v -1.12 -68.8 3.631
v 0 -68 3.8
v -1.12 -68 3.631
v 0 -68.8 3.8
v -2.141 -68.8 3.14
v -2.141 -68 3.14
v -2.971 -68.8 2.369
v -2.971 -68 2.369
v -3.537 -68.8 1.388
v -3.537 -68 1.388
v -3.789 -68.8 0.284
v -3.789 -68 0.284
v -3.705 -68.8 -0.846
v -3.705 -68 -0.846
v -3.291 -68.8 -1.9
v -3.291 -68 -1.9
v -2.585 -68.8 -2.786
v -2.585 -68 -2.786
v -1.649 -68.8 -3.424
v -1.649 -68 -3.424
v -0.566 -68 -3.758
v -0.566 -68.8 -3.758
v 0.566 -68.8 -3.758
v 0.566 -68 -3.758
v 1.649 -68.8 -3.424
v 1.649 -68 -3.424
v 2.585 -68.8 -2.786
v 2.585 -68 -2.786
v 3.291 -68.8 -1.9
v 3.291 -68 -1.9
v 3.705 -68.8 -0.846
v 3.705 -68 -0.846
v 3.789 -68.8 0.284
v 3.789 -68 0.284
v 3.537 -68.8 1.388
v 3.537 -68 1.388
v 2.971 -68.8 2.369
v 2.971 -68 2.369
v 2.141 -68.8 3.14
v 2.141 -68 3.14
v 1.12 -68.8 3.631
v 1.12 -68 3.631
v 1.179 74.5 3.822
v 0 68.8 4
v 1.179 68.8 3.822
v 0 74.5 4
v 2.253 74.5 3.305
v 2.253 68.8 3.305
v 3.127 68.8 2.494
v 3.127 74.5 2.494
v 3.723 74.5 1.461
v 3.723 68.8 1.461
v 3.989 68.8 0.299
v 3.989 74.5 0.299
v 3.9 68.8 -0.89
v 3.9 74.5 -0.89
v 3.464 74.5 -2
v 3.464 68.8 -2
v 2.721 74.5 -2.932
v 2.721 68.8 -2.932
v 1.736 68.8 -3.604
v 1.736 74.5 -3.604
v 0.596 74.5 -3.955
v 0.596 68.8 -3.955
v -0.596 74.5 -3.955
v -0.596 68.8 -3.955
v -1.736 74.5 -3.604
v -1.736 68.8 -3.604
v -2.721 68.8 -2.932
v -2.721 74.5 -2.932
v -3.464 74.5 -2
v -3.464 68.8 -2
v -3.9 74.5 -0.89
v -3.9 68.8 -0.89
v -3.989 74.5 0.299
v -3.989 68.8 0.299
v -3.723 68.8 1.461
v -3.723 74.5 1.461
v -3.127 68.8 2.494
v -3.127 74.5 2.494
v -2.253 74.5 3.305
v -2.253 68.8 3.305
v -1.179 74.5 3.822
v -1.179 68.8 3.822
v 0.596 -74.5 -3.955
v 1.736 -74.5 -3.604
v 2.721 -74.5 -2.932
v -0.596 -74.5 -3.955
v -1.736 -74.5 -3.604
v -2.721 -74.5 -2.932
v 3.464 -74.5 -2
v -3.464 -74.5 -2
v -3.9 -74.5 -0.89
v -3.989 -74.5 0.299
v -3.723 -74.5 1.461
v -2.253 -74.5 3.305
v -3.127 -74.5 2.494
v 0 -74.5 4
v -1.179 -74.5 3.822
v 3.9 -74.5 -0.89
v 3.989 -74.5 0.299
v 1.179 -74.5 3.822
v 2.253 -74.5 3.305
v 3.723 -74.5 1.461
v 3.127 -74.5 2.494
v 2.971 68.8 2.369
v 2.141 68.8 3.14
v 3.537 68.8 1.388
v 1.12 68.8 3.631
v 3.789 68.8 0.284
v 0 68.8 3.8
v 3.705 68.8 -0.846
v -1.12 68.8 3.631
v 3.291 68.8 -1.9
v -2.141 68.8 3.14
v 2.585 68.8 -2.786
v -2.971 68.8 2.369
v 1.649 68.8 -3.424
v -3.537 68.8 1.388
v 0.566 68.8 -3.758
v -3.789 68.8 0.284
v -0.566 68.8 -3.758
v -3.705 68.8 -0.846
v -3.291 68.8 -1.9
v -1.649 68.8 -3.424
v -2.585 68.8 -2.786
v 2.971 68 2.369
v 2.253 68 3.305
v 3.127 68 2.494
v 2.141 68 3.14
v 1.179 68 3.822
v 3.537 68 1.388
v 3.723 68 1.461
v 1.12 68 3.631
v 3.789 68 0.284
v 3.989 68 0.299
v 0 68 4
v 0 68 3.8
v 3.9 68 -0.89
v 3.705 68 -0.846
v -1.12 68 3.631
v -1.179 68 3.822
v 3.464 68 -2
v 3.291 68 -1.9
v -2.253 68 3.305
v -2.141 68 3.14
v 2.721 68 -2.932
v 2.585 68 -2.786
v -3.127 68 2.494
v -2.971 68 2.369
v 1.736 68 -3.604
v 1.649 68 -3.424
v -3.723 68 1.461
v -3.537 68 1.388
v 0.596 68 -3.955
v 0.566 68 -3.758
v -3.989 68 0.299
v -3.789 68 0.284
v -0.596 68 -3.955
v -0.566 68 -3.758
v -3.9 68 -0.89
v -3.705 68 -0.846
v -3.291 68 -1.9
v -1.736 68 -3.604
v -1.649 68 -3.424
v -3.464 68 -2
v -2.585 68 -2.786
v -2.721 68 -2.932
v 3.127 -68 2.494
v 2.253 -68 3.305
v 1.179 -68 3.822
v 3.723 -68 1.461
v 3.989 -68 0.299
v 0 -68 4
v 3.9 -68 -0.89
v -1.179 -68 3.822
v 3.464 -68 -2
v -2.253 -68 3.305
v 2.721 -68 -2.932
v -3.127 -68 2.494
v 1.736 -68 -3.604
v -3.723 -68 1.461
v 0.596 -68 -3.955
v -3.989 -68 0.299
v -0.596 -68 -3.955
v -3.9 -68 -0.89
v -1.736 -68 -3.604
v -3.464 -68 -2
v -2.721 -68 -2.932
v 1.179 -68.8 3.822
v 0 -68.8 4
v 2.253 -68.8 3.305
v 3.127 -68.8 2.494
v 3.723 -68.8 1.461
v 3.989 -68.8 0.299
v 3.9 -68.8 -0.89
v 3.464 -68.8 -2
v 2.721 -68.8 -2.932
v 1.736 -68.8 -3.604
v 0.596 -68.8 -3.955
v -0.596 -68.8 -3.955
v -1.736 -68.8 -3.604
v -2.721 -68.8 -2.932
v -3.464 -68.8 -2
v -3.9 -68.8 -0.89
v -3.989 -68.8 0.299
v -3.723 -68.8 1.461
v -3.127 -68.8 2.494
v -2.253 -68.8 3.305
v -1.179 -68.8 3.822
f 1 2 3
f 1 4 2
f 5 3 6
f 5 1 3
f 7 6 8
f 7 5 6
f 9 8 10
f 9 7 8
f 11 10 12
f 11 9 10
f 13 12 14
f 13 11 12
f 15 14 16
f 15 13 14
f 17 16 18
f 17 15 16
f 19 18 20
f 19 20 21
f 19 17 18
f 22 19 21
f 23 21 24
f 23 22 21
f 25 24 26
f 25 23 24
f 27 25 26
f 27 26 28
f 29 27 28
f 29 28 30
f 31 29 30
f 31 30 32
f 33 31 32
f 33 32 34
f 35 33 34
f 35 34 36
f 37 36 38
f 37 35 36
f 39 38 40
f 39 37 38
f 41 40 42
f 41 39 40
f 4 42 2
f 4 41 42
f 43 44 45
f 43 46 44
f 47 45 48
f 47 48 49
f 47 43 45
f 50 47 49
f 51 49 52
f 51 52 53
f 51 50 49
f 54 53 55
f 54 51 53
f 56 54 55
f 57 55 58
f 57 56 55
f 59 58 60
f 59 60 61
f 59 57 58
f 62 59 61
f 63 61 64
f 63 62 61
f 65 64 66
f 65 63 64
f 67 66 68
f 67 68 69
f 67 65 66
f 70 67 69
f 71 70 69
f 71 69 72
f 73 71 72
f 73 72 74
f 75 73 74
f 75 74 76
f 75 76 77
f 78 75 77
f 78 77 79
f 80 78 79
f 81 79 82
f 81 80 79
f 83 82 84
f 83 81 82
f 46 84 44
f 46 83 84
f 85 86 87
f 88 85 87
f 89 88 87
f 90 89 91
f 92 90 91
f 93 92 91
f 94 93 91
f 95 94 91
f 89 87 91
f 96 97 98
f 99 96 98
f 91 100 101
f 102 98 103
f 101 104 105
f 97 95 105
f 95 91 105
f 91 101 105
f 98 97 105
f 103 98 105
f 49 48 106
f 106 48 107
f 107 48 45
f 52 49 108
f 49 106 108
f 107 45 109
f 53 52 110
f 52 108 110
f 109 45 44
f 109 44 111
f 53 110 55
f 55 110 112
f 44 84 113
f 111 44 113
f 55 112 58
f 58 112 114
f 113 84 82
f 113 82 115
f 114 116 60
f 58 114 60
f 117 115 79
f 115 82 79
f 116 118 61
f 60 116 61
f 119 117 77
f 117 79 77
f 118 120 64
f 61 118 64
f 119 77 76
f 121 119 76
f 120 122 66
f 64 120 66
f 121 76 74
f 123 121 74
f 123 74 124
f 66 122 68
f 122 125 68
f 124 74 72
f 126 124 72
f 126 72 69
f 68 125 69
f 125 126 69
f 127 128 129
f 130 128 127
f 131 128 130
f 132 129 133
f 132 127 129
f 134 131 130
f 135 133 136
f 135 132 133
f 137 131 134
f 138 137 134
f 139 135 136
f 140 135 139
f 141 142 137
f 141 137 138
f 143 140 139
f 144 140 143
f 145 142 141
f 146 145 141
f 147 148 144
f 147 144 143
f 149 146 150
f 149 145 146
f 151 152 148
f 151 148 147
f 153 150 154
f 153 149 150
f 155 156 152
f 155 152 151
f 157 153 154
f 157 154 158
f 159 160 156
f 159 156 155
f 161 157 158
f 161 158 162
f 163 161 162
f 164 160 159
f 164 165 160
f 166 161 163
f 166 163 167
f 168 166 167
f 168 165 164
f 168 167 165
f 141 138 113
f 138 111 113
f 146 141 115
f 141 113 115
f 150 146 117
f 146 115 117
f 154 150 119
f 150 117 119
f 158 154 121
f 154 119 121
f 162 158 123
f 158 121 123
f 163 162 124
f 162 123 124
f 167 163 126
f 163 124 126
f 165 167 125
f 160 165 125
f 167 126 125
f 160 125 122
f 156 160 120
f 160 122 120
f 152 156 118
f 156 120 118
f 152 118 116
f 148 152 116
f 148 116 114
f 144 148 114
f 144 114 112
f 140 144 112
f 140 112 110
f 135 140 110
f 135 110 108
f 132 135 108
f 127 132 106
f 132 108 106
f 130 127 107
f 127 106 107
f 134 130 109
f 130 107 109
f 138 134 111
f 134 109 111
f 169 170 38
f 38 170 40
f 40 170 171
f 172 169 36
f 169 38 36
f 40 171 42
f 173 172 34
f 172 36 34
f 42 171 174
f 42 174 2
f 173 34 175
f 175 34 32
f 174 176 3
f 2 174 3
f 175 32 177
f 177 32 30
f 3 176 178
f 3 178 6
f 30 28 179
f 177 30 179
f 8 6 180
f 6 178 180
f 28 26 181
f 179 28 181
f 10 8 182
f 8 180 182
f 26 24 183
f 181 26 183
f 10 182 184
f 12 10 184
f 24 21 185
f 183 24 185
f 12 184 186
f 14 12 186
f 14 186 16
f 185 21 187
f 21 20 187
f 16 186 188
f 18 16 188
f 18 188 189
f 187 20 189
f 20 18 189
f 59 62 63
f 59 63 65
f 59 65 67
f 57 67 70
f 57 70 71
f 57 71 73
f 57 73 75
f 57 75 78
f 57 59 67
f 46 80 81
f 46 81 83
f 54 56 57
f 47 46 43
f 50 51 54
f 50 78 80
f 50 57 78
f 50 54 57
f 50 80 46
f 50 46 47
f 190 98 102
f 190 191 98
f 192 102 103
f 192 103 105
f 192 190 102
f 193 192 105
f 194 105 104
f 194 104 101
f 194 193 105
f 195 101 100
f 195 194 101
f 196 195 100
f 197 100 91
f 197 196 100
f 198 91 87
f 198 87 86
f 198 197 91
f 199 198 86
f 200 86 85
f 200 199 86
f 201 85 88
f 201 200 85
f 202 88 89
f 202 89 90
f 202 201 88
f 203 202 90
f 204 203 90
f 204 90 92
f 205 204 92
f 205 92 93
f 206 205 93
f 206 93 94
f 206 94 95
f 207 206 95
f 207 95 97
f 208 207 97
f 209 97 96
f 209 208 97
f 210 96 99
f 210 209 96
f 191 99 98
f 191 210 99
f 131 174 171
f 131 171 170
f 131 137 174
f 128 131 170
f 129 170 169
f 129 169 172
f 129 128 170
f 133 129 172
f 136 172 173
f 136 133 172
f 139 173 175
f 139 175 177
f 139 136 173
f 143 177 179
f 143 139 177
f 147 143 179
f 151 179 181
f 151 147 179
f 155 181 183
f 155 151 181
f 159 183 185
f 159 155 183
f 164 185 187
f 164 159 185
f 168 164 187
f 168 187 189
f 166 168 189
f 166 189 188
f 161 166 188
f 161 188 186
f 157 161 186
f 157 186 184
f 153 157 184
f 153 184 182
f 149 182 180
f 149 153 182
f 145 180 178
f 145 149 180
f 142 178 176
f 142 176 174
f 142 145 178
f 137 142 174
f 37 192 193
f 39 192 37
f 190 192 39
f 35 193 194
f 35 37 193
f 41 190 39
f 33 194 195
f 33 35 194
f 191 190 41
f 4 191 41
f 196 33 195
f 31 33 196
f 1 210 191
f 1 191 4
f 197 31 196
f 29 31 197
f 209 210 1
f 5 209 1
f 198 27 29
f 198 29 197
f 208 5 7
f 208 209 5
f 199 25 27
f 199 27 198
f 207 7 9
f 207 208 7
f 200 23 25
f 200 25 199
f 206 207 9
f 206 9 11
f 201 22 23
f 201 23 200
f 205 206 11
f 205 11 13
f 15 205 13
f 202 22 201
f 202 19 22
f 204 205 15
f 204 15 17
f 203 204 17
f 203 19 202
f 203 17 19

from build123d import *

# Parameters (mm, degrees)
SKETCH_1_R      = 4
EXTRUDE_1_DEPTH = 74.5
SKETCH_3_W      = 5
SKETCH_3_H      = 0.8


with BuildPart() as part:
    # 草图1 → 凸台-拉伸1 (new, symmetric)
    with BuildSketch(Plane(origin=(0, 0, 0), x_dir=(1, 0, 0), z_dir=(0, 1, 0))):
        with Locations(Location((0, 0, 0), (0, 0, 270))):
            Circle(SKETCH_1_R)
    extrude(amount=EXTRUDE_1_DEPTH, both=True)

    # 草图3 → 切除-旋转1 (revolve, cut)
    with BuildSketch(Plane(origin=(0, 0, 0), x_dir=(0, 0, -1), z_dir=(1, 0, 0)), mode=Mode.PRIVATE) as cut_revolve_1_sk:
        with Locations((6.3, 68.4)):
            Rectangle(SKETCH_3_W, SKETCH_3_H)
    cut_revolve_1 = revolve(cut_revolve_1_sk.sketch.rotate(Axis((0, 74.5, 0), (0, -1, 0)), 180), axis=Axis((0, 74.5, 0), (0, -1, 0)), mode=Mode.SUBTRACT)

    # 镜向1: 切除-旋转1 across plane
    add(cut_revolve_1.mirror(Plane.ZX), mode=Mode.SUBTRACT)


solid = part.part
